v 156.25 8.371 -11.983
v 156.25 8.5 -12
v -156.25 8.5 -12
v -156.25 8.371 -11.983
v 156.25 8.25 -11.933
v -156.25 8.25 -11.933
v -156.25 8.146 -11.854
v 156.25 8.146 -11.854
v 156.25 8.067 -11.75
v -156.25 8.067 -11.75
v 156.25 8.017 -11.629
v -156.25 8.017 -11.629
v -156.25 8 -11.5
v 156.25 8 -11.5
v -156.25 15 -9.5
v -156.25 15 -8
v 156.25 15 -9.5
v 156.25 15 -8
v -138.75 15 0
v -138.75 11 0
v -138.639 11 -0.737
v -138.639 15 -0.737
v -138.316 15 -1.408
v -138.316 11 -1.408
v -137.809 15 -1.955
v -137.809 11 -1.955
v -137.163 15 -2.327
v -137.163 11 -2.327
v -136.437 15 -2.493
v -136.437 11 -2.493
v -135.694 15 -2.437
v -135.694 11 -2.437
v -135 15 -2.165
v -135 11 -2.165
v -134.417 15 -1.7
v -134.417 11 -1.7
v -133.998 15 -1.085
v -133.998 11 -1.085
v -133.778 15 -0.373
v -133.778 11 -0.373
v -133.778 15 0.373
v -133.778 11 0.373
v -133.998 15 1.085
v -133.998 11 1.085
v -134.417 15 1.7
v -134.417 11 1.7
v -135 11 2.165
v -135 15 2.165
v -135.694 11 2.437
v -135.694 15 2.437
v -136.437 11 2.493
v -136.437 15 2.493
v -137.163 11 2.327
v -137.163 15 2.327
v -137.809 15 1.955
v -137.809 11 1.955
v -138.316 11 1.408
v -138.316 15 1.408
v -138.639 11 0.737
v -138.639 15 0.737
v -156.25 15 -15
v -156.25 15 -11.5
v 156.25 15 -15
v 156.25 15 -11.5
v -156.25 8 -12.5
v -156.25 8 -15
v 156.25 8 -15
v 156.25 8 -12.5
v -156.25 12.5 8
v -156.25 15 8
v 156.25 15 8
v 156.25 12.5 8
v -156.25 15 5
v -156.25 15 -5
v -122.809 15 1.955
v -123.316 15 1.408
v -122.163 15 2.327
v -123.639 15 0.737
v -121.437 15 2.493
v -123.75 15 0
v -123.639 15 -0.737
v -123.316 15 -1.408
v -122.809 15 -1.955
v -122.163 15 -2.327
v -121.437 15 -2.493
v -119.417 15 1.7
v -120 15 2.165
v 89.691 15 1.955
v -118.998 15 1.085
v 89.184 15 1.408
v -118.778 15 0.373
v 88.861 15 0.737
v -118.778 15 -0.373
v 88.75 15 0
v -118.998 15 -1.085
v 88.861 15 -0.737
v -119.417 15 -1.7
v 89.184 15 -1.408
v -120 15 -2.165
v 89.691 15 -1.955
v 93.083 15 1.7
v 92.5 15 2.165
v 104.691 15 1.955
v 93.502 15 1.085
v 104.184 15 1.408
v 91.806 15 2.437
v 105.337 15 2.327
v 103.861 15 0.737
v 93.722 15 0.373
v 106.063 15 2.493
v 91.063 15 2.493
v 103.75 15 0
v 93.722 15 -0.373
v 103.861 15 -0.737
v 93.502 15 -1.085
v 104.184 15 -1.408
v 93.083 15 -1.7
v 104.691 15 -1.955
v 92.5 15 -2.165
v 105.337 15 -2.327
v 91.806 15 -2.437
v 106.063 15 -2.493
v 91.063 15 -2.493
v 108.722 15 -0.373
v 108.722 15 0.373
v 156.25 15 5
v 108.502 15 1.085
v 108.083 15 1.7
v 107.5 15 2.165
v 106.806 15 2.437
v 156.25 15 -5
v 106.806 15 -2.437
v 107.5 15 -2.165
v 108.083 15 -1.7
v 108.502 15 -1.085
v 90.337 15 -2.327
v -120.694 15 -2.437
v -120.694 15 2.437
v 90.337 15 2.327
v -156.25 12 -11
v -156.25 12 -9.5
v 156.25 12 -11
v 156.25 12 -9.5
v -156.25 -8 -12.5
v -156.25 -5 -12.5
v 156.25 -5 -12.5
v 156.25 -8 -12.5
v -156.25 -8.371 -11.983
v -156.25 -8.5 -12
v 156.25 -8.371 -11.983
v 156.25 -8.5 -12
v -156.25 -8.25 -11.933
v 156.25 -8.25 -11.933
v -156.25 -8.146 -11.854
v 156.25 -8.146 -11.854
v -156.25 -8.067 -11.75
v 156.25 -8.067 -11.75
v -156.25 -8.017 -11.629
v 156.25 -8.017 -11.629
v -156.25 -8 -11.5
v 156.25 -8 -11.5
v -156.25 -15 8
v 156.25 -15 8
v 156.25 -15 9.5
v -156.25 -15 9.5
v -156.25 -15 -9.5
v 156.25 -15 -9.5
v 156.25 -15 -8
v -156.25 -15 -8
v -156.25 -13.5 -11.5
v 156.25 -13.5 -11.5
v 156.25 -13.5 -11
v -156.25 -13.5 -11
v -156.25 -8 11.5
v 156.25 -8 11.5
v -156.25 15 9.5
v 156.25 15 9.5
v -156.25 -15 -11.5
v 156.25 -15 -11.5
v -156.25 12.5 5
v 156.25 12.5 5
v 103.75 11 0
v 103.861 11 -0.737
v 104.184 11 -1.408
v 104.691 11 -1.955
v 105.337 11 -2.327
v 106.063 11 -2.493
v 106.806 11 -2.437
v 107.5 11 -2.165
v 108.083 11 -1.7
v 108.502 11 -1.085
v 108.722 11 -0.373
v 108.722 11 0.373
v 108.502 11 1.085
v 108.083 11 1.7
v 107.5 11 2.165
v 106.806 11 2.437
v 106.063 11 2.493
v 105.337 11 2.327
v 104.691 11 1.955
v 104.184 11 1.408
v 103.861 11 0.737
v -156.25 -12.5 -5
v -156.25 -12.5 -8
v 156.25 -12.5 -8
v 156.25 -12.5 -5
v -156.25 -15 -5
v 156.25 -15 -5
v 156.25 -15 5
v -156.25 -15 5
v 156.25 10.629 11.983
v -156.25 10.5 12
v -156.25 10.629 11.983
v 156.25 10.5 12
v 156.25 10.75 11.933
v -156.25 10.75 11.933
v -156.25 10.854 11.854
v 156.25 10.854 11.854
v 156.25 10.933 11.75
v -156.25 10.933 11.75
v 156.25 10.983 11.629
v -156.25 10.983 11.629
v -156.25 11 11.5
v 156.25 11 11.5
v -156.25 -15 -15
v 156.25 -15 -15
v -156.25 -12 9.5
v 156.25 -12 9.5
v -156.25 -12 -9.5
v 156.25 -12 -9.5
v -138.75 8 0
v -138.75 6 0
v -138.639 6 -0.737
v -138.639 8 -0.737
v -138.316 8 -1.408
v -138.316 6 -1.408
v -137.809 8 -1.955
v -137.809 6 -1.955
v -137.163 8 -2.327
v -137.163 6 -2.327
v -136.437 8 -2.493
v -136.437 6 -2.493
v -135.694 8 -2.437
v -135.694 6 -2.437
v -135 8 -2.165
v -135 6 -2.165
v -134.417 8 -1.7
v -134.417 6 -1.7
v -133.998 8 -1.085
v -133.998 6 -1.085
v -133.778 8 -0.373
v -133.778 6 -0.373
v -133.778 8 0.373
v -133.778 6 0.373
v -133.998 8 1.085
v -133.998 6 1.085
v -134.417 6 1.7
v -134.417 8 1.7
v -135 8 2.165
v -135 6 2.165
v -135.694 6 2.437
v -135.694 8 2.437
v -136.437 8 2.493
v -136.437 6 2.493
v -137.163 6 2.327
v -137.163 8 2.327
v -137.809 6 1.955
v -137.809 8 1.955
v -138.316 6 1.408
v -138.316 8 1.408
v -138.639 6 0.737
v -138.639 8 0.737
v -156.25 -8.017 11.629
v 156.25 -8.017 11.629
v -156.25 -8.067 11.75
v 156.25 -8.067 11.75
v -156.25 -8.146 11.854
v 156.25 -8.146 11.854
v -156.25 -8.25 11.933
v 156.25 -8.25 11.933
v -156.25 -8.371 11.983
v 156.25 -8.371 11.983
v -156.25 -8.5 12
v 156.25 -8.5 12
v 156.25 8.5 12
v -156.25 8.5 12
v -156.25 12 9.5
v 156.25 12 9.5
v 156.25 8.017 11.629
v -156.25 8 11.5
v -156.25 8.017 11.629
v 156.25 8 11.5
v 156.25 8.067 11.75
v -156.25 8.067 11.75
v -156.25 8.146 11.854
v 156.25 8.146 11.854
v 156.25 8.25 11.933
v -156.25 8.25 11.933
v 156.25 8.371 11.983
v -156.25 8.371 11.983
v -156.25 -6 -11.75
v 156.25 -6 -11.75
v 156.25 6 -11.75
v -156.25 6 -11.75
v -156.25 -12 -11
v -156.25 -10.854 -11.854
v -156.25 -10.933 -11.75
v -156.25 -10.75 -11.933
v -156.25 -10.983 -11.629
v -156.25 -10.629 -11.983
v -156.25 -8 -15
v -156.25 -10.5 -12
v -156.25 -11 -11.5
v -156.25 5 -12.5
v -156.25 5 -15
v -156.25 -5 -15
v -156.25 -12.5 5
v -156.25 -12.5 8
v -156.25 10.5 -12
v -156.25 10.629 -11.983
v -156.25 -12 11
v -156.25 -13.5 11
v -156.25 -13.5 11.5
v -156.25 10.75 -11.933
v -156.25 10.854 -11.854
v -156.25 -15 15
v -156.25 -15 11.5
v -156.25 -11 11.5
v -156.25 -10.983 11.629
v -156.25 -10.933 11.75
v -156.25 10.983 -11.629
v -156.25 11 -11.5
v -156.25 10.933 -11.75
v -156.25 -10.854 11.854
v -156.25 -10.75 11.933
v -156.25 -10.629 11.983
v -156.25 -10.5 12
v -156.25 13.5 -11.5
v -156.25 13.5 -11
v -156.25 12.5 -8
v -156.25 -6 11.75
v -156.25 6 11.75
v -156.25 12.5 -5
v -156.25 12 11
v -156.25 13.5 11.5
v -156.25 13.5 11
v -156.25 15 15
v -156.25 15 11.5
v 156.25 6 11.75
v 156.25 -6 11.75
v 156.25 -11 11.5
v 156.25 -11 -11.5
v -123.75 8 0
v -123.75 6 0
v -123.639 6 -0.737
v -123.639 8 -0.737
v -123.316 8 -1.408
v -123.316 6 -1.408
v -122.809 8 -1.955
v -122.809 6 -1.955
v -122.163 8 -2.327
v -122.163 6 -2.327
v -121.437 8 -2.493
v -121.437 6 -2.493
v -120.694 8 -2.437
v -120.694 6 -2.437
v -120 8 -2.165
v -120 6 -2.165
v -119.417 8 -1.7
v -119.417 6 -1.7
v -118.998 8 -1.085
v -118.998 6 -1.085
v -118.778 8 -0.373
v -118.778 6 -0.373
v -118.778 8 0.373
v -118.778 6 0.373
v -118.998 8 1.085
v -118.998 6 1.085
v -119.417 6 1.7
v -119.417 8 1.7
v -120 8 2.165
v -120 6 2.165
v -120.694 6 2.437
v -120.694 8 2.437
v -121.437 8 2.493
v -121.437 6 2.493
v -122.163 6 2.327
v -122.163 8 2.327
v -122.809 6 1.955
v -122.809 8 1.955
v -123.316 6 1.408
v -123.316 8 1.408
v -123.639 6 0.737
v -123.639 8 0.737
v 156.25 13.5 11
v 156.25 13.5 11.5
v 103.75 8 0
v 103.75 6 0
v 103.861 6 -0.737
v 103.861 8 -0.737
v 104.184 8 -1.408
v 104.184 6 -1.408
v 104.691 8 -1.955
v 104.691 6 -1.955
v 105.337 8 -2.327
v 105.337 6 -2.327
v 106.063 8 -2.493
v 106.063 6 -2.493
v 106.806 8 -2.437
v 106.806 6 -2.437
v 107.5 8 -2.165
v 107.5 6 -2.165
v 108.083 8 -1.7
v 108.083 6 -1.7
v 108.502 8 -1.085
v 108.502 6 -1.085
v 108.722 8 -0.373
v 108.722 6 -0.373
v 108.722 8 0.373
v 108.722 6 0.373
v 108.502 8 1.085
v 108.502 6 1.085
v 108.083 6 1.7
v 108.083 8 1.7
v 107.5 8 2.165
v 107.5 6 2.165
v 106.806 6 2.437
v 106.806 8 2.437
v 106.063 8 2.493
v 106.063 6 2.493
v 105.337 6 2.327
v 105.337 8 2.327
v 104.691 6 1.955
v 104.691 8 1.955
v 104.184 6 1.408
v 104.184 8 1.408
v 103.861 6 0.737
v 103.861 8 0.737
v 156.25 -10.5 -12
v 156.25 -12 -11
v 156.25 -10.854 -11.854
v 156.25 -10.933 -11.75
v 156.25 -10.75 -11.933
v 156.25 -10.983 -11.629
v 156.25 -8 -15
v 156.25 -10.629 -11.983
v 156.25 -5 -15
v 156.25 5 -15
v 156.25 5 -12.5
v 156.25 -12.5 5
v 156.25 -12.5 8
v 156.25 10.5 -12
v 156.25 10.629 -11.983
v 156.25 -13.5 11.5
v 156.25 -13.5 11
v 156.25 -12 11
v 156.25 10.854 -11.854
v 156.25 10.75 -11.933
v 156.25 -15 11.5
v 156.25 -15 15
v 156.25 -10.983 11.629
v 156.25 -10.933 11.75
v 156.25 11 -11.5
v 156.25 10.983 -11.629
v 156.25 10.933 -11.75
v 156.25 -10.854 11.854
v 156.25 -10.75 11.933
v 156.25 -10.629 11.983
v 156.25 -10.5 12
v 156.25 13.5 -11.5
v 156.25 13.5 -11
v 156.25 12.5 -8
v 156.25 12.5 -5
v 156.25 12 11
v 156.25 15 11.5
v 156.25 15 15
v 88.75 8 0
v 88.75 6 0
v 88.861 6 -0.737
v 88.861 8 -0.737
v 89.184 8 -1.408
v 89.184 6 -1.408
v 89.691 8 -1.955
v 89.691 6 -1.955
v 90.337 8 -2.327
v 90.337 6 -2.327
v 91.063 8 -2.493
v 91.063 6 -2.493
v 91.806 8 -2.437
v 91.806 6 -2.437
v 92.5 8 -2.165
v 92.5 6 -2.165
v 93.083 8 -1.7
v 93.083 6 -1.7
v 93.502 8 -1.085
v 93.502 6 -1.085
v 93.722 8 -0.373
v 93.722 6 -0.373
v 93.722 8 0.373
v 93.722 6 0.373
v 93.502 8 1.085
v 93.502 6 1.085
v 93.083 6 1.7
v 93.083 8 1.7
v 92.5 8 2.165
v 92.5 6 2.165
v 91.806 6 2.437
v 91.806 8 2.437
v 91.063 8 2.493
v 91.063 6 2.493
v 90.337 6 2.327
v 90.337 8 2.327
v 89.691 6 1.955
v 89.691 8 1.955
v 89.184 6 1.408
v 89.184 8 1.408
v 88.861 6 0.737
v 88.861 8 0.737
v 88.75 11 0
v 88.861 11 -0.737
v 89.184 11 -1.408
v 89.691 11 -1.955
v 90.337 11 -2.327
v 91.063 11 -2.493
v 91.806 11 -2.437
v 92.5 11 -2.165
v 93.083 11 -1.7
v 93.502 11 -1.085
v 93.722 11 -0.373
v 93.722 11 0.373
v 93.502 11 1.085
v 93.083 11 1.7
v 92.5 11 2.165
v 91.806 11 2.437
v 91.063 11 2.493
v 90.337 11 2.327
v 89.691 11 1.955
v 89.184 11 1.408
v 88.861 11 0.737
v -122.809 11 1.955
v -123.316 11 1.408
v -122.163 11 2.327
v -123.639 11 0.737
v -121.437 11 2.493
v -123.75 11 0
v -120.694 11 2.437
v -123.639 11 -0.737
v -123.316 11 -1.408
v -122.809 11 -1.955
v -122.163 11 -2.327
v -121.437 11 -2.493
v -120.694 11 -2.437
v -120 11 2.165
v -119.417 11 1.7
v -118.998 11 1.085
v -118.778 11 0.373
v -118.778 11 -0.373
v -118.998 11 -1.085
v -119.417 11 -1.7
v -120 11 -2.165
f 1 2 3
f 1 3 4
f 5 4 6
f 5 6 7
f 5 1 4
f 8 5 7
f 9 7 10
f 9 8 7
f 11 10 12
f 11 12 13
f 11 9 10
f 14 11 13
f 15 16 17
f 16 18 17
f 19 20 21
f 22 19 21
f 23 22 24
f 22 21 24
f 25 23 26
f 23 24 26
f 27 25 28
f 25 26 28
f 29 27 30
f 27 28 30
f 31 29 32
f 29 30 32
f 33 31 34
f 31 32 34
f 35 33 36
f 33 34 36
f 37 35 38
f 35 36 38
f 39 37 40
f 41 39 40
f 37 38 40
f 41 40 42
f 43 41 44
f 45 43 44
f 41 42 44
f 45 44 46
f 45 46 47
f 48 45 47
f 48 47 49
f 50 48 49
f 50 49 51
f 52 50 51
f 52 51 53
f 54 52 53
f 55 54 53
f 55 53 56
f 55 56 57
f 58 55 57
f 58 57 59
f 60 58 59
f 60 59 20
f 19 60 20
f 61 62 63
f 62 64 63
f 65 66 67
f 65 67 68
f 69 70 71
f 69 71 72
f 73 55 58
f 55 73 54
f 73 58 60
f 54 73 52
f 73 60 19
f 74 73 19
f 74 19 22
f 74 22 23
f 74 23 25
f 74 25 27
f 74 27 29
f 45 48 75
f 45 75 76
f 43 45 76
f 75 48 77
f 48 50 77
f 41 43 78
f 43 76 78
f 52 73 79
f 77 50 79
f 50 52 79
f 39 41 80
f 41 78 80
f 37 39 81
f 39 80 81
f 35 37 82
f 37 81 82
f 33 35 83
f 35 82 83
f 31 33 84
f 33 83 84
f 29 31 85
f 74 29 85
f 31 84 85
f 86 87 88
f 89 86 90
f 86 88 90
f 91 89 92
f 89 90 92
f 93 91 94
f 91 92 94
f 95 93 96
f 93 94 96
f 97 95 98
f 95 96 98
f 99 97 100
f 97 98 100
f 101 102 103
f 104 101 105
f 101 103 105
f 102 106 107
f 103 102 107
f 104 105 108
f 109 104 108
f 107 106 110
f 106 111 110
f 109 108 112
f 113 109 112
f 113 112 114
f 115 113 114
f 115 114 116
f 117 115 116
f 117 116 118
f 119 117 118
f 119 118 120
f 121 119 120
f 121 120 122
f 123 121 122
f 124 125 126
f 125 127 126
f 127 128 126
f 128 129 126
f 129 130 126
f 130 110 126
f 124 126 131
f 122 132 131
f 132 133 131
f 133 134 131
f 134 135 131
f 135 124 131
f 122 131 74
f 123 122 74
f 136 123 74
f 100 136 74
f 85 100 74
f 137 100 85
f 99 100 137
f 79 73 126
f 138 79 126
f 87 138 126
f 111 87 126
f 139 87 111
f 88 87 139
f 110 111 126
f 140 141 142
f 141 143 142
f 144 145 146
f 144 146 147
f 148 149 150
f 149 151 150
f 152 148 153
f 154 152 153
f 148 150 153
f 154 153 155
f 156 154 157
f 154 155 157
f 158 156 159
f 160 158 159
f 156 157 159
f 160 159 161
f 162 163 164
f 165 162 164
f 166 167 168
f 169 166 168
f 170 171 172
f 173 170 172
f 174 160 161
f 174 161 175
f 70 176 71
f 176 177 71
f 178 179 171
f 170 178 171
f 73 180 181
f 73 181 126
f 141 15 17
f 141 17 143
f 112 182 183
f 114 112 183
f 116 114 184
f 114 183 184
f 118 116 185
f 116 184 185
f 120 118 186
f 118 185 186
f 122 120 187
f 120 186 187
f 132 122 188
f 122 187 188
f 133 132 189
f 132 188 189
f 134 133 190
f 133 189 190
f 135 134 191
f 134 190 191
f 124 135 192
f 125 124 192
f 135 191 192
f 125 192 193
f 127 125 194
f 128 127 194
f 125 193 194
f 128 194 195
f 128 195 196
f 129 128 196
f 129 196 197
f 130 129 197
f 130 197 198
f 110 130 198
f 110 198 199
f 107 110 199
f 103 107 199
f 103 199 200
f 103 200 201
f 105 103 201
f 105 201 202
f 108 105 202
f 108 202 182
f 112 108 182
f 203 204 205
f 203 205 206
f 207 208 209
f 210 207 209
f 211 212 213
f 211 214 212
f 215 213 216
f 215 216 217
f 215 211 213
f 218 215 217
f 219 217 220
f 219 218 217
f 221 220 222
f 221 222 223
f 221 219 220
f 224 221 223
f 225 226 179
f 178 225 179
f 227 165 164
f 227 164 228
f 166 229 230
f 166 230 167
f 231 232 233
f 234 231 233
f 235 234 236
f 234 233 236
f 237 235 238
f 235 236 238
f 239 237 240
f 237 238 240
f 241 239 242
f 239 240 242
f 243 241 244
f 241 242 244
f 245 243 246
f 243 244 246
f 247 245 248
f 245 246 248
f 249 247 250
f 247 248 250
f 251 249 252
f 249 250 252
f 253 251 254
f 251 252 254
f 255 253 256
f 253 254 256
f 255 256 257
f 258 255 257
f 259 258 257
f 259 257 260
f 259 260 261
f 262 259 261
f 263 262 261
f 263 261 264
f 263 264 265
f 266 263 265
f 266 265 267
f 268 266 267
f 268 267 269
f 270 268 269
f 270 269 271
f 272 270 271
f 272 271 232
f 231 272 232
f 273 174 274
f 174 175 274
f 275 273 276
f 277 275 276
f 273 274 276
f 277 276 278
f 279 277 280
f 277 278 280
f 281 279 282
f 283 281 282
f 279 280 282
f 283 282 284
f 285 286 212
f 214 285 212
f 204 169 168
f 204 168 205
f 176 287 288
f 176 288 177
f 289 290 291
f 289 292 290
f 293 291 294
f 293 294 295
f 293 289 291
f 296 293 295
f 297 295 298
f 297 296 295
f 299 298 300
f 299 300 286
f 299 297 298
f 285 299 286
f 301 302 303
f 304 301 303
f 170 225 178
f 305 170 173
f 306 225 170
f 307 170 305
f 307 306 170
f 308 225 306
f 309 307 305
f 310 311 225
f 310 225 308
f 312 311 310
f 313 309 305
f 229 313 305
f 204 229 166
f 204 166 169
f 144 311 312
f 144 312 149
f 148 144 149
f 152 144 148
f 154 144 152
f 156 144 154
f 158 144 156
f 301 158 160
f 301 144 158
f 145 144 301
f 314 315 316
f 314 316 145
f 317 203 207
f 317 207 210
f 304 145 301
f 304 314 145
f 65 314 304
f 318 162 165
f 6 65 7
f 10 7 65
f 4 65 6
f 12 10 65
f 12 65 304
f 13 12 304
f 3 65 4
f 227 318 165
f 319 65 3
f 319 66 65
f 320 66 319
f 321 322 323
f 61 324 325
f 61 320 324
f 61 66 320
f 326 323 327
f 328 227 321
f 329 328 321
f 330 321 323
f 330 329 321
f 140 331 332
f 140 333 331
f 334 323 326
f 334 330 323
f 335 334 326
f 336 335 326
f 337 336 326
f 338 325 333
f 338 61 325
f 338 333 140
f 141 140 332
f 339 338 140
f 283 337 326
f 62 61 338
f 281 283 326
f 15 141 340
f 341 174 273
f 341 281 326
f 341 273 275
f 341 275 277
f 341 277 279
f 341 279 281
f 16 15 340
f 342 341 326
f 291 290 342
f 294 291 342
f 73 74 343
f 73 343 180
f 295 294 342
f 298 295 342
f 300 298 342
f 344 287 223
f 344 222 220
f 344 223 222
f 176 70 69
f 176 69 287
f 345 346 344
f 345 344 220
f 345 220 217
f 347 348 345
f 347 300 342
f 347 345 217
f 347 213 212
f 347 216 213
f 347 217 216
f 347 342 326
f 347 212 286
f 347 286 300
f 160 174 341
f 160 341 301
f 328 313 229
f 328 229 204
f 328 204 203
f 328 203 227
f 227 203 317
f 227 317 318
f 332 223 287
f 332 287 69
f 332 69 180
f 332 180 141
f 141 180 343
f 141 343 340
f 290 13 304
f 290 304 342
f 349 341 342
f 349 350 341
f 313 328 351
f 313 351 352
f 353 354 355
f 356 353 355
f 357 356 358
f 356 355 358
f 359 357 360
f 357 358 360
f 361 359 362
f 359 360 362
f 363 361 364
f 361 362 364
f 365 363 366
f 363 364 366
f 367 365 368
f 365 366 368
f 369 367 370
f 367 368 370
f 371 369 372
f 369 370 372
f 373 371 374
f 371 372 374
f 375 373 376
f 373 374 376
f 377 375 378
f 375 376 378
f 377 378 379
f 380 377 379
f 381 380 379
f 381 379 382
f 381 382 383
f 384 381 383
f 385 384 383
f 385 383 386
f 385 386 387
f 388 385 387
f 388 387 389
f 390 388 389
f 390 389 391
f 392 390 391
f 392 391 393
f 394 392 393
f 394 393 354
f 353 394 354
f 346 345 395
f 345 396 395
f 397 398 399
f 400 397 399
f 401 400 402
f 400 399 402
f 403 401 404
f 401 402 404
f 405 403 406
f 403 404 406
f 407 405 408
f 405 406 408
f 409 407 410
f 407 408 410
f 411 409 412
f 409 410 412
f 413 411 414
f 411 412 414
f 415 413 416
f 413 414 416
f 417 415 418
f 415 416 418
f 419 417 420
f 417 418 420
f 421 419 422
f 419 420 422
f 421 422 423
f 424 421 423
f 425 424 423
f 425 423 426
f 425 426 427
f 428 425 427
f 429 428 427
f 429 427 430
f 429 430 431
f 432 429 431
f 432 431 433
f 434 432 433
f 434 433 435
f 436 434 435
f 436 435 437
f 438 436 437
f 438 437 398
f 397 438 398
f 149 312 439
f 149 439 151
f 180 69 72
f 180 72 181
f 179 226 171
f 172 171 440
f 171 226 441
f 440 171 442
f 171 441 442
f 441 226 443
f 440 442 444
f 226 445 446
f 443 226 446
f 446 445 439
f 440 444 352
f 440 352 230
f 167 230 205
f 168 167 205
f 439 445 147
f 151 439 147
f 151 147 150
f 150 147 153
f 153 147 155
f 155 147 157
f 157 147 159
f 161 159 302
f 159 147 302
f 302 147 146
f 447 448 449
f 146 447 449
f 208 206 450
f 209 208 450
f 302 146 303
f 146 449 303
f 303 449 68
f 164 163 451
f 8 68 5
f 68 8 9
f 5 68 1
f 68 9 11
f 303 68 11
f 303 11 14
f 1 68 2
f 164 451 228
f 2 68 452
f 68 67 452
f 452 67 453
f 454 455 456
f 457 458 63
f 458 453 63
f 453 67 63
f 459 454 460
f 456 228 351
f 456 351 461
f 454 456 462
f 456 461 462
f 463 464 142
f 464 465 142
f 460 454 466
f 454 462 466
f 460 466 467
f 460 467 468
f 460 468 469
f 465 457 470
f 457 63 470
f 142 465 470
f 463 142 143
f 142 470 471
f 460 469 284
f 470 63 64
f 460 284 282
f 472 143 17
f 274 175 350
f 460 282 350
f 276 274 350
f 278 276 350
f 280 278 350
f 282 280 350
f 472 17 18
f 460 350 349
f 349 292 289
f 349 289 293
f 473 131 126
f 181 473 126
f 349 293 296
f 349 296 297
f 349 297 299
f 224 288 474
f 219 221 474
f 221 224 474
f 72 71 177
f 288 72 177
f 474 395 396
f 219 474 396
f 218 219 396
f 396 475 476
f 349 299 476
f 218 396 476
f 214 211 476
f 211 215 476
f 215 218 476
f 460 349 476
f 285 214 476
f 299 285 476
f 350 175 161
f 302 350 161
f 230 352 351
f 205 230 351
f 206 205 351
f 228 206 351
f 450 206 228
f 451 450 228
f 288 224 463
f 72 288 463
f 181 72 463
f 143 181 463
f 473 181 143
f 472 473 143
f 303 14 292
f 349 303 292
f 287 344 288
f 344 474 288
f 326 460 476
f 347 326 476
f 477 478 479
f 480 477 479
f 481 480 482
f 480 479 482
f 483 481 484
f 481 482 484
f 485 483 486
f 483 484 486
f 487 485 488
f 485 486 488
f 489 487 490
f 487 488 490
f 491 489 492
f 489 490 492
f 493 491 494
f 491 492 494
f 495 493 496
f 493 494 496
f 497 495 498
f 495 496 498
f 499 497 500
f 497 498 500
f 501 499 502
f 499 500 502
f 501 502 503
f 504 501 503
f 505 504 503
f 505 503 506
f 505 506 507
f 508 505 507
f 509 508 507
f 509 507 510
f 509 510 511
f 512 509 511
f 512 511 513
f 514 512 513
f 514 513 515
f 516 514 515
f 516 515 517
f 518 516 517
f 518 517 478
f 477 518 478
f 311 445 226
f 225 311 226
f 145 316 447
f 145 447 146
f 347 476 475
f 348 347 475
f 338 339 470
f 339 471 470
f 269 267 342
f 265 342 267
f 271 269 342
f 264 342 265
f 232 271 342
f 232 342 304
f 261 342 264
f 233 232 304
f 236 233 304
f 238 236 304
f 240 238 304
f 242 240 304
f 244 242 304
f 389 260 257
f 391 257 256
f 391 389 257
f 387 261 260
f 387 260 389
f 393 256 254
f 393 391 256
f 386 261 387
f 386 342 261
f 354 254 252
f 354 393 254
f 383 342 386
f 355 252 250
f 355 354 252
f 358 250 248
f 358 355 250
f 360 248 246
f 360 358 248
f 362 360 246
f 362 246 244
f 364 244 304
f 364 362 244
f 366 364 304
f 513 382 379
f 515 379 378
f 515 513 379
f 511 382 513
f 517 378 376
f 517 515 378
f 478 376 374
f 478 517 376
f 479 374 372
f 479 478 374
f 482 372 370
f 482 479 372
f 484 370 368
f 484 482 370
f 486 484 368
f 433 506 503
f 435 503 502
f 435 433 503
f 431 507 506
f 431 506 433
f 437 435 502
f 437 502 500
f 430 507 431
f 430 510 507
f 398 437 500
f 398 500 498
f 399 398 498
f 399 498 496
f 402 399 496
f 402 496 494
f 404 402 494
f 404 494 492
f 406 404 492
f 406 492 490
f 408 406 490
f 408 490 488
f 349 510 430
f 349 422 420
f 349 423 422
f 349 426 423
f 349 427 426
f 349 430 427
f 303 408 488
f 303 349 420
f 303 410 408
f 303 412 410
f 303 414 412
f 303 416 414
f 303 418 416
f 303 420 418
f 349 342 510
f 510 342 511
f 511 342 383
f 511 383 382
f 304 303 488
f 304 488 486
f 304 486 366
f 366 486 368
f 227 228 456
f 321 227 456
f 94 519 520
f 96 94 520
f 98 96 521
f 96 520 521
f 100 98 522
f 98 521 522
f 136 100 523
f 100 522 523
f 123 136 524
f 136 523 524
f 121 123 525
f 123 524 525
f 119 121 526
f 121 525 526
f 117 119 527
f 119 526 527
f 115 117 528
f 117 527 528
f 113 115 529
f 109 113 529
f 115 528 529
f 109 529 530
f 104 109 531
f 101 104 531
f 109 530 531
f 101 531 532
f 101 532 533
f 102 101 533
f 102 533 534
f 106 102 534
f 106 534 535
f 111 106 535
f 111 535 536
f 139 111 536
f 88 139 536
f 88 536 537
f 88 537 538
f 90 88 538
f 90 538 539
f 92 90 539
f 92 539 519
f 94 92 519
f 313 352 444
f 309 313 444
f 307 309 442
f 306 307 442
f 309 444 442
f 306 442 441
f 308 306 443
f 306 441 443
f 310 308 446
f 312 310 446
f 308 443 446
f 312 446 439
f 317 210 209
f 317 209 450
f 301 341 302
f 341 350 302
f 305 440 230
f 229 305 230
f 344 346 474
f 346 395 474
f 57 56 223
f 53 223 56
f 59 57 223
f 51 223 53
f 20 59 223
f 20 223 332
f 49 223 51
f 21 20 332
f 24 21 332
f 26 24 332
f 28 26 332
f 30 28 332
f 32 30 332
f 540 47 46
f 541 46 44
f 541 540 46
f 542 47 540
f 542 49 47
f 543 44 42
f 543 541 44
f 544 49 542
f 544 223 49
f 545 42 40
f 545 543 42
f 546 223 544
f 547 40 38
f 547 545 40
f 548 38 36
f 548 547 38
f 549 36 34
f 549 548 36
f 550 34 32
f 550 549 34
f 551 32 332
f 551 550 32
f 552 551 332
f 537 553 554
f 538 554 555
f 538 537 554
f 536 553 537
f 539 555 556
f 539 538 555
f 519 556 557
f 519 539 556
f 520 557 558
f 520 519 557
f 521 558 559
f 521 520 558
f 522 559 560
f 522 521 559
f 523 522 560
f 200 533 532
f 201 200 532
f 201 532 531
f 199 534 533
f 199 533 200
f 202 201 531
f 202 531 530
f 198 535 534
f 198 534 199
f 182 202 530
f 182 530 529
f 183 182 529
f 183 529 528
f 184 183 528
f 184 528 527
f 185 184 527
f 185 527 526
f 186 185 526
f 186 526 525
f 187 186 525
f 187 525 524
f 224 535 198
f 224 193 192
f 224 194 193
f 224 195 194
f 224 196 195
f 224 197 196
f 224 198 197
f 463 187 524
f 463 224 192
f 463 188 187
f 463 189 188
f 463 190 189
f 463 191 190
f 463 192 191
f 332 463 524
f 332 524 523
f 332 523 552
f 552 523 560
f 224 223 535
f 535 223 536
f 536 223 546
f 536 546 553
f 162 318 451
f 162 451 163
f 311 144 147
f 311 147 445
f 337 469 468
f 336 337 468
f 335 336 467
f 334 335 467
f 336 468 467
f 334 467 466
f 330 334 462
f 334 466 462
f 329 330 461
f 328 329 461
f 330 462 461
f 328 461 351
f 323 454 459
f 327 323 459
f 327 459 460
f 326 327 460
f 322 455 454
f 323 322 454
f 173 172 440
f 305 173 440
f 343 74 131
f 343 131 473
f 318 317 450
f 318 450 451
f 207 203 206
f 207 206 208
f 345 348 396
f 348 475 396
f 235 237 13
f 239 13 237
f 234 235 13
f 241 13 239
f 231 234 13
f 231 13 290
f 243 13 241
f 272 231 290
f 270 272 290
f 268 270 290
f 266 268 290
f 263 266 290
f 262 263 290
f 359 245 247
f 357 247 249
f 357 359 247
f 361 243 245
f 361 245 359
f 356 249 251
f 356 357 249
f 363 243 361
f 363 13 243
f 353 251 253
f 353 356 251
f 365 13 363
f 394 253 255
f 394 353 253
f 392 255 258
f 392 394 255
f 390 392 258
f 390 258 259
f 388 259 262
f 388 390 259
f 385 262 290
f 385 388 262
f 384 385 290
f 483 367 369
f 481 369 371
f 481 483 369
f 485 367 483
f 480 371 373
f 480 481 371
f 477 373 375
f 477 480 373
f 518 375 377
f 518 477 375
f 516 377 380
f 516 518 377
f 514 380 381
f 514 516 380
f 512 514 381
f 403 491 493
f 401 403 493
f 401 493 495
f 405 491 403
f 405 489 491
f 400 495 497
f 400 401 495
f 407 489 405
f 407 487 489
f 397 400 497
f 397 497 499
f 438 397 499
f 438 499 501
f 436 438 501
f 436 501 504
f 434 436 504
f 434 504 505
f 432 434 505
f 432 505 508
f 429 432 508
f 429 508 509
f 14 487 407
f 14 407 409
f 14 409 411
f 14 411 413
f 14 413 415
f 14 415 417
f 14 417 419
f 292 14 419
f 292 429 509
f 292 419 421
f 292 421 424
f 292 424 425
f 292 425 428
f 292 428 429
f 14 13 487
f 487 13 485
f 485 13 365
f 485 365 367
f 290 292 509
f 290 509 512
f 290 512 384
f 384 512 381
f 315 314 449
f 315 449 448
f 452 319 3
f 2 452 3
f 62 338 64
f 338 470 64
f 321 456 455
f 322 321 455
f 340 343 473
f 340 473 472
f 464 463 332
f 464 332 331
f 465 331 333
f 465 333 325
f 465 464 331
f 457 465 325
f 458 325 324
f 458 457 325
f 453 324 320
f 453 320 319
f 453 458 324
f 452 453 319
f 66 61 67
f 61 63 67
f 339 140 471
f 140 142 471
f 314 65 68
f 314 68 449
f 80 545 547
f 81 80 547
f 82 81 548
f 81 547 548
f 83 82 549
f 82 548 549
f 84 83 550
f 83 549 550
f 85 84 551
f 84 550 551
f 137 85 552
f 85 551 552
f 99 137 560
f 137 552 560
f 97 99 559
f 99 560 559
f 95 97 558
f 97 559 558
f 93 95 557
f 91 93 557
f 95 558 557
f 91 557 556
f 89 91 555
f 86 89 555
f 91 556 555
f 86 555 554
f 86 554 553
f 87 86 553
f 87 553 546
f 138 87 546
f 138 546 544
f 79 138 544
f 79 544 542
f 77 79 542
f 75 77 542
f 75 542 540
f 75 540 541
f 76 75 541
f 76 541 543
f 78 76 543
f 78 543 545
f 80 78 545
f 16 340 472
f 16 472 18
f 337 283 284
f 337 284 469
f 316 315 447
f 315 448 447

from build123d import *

# Parameters (mm, degrees)
SKETCH_1_W             = 23.5
SKETCH_1_H             = 12
EXTRUDE_1_DEPTH        = 156.25
HOLE_WIZARD_M6_1_D     = 5
HOLE_WIZARD_M6_1_DEPTH = 19
HOLE_WIZARD_M6_1_TIP   = 1.502151548


with BuildPart() as part:
    # 草图1 → 凸台-拉伸1 (new, symmetric)
    with BuildSketch(Plane(origin=(0, 0, 0), x_dir=(0, 0, -1), z_dir=(1, 0, 0))):
        Polygon((-15, 15), (-11.5, 15), (-11.5, 13.5), (-11, 13.5), (-11, 12), (-9.5, 12), (-9.5, 15), (-8, 15), (-8, 12.5), (-5, 12.5), (-5, 15), (5, 15), (5, 12.5), (8, 12.5), (8, 15), (9.5, 15), (9.5, 12), (11, 12), (11, 13.5), (11.5, 13.5), (11.5, 15), (15, 15), (15, 8), (12.5, 8), (12.5, 5), (15, 5), (15, -5), (12.5, -5), (12.5, -8), (15, -8), (15, -15), (11.5, -15), (11.5, -13.5), (11, -13.5), (11, -12), (9.5, -12), (9.5, -15), (8, -15), (8, -12.5), (5, -12.5), (5, -15), (-5, -15), (-5, -12.5), (-8, -12.5), (-8, -15), (-9.5, -15), (-9.5, -12), (-11, -12), (-11, -13.5), (-11.5, -13.5), (-11.5, -15), (-15, -15), align=None)
        with BuildLine():
            Line((12, -10.5), (12, -8.5))
            ThreePointArc((12, -8.5), (11.853553391, -8.146446609), (11.5, -8))
            Line((11.5, -8), (-11.5, -8))
            ThreePointArc((-11.5, -8), (-11.853553391, -8.146446609), (-12, -8.5))
            Line((-12, -8.5), (-12, -10.5))
            ThreePointArc((-12, -10.5), (-11.853553391, -10.853553391), (-11.5, -11))
            Line((-11.5, -11), (11.5, -11))
            ThreePointArc((11.5, -11), (11.853553391, -10.853553391), (12, -10.5))
        make_face(mode=Mode.SUBTRACT)
        with BuildLine():
            Line((-11.5, 11), (11.5, 11))
            ThreePointArc((11.5, 11), (11.853553391, 10.853553391), (12, 10.5))
            Line((12, 10.5), (12, 8.5))
            ThreePointArc((12, 8.5), (11.853553391, 8.146446609), (11.5, 8))
            Line((11.5, 8), (-11.5, 8))
            ThreePointArc((-11.5, 8), (-11.853553391, 8.146446609), (-12, 8.5))
            Line((-12, 8.5), (-12, 10.5))
            ThreePointArc((-12, 10.5), (-11.853553391, 10.853553391), (-11.5, 11))
        make_face(mode=Mode.SUBTRACT)
        Rectangle(SKETCH_1_W, SKETCH_1_H, mode=Mode.SUBTRACT)
    extrude(amount=EXTRUDE_1_DEPTH, both=True)

    # M6 螺纹孔1
    with Locations(Plane(origin=(0, 15, 0), x_dir=(1, 0, 0), z_dir=(0, 1, 0))):
        with Locations((106.25, 0), (91.25, 0), (-121.25, 0), (-136.25, 0)):
            Hole(HOLE_WIZARD_M6_1_D / 2, depth=HOLE_WIZARD_M6_1_DEPTH)
            with Locations((0, 0, -(HOLE_WIZARD_M6_1_DEPTH + HOLE_WIZARD_M6_1_TIP / 2))):  # 118° drill point
                Cone(0, HOLE_WIZARD_M6_1_D / 2, HOLE_WIZARD_M6_1_TIP, mode=Mode.SUBTRACT)


solid = part.part
